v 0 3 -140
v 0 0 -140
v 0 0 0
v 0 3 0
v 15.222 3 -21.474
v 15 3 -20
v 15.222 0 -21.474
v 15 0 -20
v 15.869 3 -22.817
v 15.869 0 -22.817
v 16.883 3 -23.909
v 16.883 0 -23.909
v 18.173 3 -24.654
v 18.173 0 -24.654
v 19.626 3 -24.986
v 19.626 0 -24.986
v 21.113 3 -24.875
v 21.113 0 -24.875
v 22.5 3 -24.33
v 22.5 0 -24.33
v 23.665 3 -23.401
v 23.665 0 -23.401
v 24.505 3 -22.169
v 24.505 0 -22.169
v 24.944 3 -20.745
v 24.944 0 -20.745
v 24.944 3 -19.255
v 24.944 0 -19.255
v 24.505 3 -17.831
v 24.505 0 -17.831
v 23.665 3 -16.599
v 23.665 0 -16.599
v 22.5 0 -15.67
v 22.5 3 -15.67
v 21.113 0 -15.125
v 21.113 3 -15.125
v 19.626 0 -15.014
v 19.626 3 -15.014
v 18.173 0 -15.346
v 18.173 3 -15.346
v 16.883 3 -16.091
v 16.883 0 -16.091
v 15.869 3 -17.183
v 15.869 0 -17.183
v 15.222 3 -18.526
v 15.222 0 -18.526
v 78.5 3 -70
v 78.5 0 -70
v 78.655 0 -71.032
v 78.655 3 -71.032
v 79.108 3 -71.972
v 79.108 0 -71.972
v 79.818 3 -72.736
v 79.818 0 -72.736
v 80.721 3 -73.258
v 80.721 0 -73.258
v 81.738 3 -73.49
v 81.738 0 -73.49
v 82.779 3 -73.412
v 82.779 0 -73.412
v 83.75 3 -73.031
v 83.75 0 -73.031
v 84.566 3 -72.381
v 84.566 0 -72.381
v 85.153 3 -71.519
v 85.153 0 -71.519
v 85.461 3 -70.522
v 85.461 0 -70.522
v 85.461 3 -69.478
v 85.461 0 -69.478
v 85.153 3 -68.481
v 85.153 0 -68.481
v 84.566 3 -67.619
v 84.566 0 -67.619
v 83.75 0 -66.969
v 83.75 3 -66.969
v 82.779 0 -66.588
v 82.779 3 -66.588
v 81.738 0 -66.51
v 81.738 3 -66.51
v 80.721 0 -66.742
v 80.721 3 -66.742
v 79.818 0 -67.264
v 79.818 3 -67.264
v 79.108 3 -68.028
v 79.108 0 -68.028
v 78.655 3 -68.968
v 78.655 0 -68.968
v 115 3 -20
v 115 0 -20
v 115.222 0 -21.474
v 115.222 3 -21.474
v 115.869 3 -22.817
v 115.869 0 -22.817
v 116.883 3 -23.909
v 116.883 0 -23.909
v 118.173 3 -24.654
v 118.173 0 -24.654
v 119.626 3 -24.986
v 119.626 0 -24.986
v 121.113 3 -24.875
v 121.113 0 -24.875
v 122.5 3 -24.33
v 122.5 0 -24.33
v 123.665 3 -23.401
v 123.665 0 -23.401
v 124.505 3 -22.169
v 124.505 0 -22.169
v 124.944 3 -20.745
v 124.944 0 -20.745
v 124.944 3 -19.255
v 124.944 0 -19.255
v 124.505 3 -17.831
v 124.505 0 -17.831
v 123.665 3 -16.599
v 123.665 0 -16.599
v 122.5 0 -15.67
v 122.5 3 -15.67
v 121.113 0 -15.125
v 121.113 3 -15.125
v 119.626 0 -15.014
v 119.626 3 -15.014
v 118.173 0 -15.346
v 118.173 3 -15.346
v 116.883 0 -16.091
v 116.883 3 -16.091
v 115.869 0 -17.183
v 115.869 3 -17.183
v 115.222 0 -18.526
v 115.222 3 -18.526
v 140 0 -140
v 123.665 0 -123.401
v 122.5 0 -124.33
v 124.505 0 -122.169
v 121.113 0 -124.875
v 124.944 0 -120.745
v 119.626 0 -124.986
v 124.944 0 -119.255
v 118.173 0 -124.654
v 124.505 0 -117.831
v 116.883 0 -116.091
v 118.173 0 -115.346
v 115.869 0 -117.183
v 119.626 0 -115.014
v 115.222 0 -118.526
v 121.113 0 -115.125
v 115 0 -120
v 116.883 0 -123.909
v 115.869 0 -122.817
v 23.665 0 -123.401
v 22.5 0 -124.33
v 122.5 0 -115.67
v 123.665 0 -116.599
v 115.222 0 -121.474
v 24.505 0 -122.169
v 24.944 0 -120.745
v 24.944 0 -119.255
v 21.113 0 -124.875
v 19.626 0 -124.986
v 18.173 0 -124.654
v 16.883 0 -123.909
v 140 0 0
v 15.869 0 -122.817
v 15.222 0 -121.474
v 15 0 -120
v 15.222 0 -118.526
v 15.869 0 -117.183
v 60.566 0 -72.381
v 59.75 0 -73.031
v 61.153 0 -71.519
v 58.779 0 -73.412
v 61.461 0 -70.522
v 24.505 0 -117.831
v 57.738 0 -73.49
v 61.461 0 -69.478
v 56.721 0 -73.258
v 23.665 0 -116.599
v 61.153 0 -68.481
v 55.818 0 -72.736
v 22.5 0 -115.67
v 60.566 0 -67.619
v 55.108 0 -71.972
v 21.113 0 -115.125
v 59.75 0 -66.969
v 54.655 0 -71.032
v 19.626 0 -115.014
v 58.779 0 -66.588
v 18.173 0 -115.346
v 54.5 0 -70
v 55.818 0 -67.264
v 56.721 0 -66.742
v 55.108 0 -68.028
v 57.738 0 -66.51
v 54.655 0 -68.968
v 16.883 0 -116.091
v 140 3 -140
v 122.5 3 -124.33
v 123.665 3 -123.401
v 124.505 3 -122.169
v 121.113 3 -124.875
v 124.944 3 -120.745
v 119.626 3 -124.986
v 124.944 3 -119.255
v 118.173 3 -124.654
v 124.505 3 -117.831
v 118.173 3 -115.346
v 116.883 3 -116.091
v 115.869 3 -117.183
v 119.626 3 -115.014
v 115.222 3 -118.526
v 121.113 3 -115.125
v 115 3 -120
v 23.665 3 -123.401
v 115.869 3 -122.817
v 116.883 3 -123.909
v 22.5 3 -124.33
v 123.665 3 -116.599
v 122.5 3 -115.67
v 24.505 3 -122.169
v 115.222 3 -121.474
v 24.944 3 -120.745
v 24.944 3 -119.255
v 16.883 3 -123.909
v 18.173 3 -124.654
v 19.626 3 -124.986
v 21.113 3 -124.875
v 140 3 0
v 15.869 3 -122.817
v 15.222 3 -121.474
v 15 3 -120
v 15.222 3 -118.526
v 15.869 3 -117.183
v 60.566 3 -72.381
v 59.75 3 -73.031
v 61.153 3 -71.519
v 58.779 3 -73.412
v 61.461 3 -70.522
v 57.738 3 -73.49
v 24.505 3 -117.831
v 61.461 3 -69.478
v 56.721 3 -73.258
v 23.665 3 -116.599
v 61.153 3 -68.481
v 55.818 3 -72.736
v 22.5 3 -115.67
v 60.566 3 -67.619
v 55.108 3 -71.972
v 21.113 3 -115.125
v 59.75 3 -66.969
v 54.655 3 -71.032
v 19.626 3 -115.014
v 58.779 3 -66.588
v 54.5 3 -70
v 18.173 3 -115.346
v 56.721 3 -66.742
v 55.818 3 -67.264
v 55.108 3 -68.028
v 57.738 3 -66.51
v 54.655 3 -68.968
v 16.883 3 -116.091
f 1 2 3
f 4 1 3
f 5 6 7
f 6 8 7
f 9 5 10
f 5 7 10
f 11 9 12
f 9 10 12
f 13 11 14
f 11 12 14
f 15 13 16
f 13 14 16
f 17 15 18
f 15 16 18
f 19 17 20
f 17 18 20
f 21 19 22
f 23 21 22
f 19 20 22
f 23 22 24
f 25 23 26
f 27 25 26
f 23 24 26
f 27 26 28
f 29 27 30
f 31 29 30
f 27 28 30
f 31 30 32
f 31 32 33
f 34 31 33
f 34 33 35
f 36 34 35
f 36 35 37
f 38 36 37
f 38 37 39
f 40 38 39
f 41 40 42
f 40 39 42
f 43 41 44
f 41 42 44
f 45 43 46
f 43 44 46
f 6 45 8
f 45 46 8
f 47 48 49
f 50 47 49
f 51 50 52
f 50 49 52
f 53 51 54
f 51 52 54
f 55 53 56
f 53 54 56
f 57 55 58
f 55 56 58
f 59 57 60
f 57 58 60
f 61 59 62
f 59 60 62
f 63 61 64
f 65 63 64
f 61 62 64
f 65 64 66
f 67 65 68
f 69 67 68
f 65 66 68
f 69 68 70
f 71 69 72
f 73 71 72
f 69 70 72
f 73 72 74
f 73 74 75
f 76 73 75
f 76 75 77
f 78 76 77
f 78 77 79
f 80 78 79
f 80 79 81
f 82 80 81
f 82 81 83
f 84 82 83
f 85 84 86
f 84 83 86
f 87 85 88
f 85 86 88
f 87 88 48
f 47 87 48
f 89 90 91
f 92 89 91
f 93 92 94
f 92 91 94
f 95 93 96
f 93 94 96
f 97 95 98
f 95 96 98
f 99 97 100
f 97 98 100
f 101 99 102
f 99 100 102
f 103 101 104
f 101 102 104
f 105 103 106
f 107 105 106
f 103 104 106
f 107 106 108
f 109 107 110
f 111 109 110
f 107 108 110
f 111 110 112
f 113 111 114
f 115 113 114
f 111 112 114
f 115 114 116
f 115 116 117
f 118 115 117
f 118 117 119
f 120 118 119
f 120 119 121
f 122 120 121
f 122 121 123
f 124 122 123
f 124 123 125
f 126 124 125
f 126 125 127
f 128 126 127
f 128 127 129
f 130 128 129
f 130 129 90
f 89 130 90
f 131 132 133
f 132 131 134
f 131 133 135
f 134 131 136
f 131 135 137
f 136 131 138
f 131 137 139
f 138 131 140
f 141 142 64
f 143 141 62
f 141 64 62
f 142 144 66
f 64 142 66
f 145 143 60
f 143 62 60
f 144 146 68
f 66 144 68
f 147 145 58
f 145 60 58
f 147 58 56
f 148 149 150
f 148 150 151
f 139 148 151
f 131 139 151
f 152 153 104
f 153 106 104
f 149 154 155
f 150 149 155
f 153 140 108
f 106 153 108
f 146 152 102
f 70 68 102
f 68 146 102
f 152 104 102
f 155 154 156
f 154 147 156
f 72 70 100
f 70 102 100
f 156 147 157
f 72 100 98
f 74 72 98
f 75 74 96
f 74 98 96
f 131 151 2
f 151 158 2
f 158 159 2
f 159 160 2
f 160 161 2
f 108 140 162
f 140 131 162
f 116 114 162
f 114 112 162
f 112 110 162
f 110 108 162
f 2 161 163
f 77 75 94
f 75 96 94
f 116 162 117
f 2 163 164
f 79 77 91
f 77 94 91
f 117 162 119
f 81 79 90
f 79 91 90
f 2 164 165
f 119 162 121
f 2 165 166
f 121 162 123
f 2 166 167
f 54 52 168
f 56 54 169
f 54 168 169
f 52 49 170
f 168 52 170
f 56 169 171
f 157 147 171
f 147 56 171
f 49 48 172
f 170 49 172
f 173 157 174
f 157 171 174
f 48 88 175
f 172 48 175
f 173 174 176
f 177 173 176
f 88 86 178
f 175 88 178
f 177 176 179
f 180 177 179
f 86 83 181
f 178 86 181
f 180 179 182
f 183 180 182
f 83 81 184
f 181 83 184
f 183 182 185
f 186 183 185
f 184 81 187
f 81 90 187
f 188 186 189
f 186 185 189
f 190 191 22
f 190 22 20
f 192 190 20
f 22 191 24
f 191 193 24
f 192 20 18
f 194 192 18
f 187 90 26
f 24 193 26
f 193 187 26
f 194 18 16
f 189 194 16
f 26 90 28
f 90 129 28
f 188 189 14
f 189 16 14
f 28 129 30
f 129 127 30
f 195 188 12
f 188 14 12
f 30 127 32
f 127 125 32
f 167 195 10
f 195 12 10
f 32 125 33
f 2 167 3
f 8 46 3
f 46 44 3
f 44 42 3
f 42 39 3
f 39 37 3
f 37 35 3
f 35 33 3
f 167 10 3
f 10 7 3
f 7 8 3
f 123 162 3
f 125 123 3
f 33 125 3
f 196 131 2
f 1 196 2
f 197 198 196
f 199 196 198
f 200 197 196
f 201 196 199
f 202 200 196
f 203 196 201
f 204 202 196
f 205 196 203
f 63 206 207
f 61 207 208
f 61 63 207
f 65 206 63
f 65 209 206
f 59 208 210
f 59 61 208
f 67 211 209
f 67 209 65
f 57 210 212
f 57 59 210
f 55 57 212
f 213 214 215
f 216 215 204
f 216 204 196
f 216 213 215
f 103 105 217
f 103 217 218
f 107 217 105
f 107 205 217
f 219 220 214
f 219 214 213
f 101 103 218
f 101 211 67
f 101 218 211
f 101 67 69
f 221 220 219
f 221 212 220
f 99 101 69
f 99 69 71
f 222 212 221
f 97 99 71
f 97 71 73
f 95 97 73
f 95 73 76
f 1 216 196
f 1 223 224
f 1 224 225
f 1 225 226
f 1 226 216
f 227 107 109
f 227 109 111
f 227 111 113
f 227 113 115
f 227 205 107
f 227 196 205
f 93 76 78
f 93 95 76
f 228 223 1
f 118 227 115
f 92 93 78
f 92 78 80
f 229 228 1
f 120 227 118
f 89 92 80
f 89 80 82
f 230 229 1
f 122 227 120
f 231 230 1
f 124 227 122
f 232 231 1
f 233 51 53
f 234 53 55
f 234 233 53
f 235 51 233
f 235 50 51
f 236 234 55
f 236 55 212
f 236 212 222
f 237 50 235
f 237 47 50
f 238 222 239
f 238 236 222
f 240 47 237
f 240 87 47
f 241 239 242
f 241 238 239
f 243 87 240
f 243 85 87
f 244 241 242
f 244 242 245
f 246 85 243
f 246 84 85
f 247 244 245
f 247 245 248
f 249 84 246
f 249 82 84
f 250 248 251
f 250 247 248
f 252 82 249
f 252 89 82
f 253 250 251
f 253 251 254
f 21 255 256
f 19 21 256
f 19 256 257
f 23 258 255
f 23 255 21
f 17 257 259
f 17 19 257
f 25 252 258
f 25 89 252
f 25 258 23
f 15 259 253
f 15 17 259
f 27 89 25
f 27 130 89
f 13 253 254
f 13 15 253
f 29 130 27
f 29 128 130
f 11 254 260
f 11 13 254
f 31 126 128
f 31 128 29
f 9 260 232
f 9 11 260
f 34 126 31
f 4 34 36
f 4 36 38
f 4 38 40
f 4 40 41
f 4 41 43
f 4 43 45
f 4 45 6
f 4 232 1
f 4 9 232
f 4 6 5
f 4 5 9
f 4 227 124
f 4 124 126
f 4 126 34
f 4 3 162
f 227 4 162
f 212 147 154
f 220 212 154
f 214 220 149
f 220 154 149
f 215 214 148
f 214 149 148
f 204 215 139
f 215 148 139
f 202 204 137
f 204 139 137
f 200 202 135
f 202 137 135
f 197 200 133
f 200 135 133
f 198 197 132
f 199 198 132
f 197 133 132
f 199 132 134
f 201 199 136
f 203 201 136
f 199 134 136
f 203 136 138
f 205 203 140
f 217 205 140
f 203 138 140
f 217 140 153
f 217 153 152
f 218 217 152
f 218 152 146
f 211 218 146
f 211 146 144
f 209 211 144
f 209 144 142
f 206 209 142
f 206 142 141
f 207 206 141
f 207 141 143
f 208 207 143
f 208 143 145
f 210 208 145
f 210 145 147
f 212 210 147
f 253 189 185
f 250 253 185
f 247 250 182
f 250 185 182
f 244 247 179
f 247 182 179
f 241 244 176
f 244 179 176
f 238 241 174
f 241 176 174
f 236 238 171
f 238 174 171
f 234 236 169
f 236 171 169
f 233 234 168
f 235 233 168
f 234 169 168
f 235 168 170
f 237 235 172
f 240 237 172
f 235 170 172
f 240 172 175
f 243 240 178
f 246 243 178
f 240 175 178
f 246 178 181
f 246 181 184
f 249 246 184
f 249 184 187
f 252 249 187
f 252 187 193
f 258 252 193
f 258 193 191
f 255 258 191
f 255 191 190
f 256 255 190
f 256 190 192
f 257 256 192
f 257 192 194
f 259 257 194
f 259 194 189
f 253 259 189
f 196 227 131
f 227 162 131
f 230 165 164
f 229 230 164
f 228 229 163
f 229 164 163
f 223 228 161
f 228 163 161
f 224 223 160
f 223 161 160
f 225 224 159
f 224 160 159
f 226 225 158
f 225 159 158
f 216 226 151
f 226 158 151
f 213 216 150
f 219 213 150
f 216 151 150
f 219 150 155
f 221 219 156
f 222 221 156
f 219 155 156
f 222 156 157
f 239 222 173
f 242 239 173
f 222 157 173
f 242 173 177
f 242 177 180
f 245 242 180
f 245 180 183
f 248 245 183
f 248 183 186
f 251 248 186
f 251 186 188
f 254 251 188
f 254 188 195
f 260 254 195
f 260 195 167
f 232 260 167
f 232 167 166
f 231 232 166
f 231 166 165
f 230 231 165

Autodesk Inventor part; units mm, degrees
ref_plane "YZ Plane" through (0, 0, 0) normal (1, 0, 0) x (0, 1, 0)
ref_plane "XZ Plane" through (0, 0, 0) normal (0, 1, 0) x (-1, 0, 0)
ref_plane "XY Plane" through (0, 0, 0) normal (0, 0, 1) x (1, 0, 0)
sketch "Эскиз1" plane through (0, 0, 0) normal (0, 1, 0) x (-1, 0, 0)
  line L0 (0, 0) -> (-140, 0)
  line L1 (-140, 0) -> (-140, -140)
  line L2 (-140, -140) -> (0, -140)
  line L3 (0, -140) -> (0, 0)
  line L4 (0, 0) -> (-20, 0)
  line L5 (-20, 0) -> (-20, -20)
  line L6 (-20, -20) -> (0, -20)
  line L7 (0, -20) -> (0, 0)
  line L8 (-140, -140) -> (-120, -140)
  line L9 (-120, -140) -> (-120, -120)
  line L10 (-120, -120) -> (-140, -120)
  line L11 (-140, -120) -> (-140, -140)
  line L12 (-120, -120) -> (-20, -120)
  line L13 (-20, -120) -> (-20, -20)
  line L14 (-20, -20) -> (-120, -20)
  line L15 (-120, -20) -> (-120, -120)
  circle A0 centre (-20, -20) radius 5
  circle A1 centre (-20, -120) radius 5
  circle A2 centre (-120, -20) radius 5
  circle A3 centre (-120, -120) radius 5
  line L16 (-140, -70) -> (0, -70)
  line L17 (-70, -70) -> (-58, -70)
  line L18 (-58, -70) -> (-82, -70)
  circle A4 centre (-58, -70) radius 3.5
  circle A5 centre (-82, -70) radius 3.5
  dimension "d0" = 140
  dimension "d1" = 140
  dimension "d2" = 20
  dimension "d3" = 20
  dimension "d4" = 20
  dimension "d5" = 20
  dimension "d6" = 10
  dimension "d7" = 10
  dimension "d8" = 10
  dimension "d9" = 10
  dimension "d10" = 12
  dimension "d11" = 24
  dimension "d12" = 7
  dimension "d13" = 7
extrude "Выдавливание1" add sketch "Эскиз1" along normal blind 3 contours L3 L6 A0 L5 L0 | L5 A0 L14 A2 L15 L16 L1 L0 | L3 L16 L13 A0 L6 | L3 L2 L9 A3 L12 A1 L13 L16 | L16 L15 A3 L10 L1 | A0 L13 L16 A4 A5 L15 A2 L14 | L13 A1 L12 A3 L15 L16 A5 A4 | L10 A3 L9 L2 L1
properties part number "Пластина"
